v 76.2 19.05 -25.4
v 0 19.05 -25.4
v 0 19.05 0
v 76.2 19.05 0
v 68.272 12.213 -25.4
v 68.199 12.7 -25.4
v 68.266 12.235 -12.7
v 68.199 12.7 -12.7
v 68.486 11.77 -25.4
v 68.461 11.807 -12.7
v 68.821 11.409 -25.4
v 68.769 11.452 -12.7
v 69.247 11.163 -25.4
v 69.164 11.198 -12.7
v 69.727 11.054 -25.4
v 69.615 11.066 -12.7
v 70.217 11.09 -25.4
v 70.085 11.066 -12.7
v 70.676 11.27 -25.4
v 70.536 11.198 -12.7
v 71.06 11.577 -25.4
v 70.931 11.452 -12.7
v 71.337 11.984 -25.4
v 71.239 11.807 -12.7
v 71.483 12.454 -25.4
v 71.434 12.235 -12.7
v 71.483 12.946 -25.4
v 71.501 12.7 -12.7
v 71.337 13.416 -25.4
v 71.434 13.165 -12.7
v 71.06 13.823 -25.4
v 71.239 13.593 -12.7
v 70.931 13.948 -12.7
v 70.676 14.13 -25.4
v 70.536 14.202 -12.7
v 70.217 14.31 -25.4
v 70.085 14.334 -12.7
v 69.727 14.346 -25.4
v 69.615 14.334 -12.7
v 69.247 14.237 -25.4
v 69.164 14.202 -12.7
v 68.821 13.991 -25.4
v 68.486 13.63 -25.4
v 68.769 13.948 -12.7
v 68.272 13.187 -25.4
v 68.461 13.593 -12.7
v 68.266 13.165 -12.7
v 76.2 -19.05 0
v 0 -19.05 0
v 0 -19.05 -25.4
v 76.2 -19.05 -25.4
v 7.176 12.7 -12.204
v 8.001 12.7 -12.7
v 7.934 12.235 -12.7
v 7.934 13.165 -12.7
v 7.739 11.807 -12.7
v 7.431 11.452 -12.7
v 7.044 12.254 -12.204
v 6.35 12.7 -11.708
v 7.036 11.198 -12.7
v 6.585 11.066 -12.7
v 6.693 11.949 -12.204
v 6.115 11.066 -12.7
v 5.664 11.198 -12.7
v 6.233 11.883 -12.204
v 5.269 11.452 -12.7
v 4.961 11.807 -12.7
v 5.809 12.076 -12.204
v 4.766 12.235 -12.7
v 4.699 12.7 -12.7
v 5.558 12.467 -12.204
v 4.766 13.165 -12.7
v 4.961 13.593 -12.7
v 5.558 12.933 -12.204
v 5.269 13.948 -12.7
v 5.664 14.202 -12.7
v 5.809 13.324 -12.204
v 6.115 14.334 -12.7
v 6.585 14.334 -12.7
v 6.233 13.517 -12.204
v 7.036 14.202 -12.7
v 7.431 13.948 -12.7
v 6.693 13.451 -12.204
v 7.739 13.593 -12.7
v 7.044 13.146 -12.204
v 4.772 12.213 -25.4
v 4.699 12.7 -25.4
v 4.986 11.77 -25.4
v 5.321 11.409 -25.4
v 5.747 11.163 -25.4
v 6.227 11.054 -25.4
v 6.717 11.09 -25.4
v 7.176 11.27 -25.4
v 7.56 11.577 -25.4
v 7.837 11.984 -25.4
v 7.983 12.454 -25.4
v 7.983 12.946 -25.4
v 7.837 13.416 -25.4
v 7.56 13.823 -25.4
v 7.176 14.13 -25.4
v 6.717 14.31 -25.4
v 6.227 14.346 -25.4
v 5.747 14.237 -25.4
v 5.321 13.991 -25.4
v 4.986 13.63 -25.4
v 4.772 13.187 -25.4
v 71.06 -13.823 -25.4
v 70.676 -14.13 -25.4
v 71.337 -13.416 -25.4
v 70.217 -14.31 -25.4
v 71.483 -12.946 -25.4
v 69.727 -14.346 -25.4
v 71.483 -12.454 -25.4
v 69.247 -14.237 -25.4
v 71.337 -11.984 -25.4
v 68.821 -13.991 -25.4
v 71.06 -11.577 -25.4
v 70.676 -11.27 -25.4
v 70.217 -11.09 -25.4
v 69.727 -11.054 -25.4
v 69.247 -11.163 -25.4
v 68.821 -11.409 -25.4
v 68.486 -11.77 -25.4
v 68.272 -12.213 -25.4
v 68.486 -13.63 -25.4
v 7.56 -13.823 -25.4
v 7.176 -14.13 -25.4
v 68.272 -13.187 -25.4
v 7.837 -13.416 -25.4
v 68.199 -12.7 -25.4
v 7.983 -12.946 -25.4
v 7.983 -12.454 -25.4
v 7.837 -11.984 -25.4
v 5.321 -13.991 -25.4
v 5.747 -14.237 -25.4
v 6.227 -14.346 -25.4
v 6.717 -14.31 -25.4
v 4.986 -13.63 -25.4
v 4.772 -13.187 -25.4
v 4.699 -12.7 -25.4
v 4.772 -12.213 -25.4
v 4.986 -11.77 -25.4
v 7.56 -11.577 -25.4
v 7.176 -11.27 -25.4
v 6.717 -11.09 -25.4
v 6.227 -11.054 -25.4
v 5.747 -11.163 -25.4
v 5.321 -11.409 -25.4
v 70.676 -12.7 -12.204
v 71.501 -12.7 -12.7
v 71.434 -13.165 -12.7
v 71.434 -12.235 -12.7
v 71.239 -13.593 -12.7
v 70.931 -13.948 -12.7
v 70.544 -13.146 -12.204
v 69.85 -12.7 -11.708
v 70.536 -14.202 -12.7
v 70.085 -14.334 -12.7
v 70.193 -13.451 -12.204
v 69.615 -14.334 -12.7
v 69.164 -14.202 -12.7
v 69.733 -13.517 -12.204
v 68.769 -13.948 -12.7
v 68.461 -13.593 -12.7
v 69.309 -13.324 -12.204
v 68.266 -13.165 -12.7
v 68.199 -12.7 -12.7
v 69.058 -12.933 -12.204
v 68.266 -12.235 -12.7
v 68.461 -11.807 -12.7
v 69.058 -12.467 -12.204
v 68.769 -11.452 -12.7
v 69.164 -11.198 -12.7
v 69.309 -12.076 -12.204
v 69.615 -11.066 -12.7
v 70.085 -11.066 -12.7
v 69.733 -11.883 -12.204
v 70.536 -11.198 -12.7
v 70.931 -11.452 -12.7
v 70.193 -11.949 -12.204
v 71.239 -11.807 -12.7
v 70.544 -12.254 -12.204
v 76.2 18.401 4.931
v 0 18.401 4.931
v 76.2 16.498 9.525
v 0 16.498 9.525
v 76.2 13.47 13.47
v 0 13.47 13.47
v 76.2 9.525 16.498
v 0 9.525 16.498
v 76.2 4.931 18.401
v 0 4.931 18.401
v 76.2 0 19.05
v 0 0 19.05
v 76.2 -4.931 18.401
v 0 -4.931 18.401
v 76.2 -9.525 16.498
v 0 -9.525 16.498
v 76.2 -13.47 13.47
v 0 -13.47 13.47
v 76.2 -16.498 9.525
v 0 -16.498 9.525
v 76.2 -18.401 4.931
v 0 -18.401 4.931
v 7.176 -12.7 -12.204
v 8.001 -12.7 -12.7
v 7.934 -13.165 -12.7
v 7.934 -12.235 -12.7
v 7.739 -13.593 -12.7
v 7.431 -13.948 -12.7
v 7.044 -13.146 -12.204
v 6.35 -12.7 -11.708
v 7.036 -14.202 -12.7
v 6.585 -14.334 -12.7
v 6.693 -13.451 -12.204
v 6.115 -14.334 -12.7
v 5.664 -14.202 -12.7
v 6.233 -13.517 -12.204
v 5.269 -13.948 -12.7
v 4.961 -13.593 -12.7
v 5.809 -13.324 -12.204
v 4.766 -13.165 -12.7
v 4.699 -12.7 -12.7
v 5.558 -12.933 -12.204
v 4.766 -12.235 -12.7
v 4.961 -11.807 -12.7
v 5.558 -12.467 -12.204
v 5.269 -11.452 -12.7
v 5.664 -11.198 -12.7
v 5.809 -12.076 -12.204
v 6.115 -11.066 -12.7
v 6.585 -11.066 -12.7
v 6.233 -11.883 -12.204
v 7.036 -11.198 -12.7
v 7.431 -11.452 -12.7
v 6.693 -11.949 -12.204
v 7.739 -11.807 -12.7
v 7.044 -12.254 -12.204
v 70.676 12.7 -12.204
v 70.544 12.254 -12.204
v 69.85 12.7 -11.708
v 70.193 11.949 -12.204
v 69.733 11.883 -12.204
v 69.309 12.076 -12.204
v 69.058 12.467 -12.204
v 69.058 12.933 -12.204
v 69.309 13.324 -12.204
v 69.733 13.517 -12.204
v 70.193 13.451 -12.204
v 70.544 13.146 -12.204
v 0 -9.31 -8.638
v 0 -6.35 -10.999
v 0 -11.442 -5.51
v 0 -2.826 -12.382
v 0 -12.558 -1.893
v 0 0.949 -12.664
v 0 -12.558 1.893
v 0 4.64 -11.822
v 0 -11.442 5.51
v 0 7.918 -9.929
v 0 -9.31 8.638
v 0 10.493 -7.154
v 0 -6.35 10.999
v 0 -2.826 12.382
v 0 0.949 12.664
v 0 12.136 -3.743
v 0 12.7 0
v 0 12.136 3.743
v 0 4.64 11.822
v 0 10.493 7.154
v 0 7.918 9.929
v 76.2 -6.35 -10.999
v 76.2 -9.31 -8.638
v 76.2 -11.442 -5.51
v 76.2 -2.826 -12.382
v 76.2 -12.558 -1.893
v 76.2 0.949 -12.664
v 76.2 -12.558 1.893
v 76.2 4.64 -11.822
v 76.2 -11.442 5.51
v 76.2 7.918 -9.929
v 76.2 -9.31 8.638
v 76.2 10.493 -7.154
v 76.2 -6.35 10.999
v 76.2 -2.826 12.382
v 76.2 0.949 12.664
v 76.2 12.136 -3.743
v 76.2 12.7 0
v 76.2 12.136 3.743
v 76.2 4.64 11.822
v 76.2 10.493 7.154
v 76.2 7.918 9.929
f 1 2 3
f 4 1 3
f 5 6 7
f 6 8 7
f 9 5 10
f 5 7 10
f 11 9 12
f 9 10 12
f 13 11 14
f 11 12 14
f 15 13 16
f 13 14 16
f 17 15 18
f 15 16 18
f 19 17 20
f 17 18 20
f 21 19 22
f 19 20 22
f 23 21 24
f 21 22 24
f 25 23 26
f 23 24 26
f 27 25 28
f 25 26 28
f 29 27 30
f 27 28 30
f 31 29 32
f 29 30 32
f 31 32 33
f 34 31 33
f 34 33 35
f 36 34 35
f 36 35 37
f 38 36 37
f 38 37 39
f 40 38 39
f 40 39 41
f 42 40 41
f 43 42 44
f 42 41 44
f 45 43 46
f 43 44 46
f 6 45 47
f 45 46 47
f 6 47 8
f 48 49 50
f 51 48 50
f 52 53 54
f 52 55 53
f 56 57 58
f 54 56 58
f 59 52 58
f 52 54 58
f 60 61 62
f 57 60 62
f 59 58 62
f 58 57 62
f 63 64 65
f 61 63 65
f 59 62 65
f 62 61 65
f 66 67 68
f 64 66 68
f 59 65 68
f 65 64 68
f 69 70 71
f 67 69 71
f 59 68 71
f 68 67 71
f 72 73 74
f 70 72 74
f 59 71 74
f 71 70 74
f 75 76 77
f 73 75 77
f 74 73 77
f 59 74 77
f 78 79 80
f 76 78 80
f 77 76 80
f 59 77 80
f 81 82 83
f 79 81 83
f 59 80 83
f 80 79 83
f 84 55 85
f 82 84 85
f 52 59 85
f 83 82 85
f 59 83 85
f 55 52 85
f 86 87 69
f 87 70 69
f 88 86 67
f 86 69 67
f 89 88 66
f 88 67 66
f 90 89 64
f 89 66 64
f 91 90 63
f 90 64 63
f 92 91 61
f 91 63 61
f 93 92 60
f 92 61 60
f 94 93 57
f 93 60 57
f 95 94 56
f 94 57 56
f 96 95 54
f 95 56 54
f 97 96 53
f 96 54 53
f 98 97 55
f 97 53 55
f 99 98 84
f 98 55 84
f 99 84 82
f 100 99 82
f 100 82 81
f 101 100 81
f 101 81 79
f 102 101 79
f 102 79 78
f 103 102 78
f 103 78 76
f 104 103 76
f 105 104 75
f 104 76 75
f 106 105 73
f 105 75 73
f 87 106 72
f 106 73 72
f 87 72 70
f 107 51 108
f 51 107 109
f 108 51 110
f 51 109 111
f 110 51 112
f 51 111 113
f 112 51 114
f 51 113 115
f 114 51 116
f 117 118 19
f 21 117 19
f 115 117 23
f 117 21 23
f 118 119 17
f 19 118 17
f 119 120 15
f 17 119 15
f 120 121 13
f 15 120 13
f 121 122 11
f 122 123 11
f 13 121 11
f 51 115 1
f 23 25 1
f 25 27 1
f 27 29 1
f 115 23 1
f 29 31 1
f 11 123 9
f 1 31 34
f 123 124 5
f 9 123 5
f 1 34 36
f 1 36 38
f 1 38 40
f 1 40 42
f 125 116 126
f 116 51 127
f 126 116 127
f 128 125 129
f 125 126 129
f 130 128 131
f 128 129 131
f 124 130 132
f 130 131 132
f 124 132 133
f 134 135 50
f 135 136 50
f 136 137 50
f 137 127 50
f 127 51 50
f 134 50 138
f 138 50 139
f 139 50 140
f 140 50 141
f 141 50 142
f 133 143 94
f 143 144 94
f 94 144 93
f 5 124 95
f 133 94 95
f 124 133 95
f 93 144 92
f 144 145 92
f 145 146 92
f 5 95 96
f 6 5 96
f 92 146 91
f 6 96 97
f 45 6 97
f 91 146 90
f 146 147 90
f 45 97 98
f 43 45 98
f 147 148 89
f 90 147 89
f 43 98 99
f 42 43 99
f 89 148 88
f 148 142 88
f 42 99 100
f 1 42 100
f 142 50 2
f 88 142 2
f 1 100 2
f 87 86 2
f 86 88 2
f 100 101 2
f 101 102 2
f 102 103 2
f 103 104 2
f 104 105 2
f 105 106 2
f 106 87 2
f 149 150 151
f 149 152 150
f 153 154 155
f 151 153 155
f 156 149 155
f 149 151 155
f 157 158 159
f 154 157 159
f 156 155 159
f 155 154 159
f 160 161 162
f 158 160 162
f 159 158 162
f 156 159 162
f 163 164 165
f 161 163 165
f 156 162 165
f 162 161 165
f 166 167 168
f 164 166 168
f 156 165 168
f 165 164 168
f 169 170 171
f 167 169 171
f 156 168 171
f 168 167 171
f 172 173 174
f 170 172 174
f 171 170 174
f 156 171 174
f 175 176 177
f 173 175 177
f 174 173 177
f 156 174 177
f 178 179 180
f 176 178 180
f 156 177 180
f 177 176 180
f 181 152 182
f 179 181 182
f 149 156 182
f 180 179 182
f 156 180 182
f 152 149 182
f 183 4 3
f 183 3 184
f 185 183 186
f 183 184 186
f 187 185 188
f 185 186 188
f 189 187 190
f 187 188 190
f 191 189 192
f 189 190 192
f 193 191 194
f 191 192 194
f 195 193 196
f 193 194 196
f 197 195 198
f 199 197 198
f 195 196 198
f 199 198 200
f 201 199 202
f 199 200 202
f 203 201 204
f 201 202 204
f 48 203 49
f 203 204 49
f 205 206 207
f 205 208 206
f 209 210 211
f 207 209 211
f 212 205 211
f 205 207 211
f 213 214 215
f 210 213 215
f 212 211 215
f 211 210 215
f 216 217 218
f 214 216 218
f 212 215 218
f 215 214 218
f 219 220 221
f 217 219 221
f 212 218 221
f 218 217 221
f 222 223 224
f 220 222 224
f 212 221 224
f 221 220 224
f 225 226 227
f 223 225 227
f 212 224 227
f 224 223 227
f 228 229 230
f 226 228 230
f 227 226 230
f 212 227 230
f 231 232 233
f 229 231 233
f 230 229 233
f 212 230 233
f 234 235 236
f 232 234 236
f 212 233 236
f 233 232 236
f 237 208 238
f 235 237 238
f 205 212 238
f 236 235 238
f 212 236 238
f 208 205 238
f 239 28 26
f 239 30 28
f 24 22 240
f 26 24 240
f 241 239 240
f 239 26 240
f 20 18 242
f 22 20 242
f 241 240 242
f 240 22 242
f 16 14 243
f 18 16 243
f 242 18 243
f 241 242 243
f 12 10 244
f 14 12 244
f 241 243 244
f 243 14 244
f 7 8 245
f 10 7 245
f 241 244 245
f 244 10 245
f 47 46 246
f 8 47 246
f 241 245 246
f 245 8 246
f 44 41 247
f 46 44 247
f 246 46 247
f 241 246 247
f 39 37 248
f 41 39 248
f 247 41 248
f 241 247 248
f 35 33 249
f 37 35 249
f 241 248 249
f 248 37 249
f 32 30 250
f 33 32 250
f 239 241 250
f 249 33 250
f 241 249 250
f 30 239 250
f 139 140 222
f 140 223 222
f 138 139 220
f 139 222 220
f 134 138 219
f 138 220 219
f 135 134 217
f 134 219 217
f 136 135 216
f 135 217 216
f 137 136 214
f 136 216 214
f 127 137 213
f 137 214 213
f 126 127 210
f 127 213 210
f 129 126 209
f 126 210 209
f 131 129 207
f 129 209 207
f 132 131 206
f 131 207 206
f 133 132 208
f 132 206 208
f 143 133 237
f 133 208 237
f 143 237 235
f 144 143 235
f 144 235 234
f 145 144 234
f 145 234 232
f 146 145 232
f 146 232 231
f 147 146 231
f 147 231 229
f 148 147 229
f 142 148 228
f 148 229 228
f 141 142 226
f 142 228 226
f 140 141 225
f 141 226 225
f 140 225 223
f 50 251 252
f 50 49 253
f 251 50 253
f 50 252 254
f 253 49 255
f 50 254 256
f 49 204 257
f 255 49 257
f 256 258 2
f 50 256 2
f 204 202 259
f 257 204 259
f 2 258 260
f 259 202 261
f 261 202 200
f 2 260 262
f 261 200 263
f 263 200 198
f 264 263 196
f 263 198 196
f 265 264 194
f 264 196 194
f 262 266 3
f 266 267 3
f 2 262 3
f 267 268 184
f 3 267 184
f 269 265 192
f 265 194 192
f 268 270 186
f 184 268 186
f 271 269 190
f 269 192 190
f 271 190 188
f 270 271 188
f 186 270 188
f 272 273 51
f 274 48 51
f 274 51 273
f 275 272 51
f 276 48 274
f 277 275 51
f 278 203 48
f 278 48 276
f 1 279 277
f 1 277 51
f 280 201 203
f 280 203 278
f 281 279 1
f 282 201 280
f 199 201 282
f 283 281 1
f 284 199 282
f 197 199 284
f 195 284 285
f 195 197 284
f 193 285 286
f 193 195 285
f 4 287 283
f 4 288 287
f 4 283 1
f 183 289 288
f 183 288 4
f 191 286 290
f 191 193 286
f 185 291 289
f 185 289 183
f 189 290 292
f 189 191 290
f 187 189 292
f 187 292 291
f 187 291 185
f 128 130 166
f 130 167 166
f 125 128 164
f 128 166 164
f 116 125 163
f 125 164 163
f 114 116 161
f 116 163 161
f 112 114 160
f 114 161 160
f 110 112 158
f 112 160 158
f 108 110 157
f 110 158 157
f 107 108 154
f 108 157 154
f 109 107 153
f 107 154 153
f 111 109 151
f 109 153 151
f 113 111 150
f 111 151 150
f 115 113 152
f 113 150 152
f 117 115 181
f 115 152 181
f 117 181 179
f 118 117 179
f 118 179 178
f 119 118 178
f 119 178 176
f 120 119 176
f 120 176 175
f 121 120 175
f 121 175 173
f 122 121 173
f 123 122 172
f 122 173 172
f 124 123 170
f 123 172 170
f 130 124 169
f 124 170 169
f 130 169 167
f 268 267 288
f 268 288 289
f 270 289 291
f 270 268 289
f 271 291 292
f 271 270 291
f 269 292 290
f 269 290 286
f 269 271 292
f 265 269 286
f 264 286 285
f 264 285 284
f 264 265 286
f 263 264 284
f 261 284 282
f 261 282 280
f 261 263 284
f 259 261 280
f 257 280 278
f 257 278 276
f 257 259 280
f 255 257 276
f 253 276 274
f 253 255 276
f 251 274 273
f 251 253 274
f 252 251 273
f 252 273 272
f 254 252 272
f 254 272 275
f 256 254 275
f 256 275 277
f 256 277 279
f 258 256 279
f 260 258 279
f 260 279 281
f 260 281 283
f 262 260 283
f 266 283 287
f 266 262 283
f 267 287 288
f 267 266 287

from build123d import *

# Parameters (mm, degrees)
F0_R     = 12.7
F1_DEPTH = 76.2
F4_D     = 3.302
F4_DEPTH = 12.7
F4_TIP   = 0.992020882


with BuildPart() as f1:
    # F0 (on Right) → F1 (new body)
    with BuildSketch(Plane.YZ):
        with BuildLine():
            Line((19.05, -25.4), (19.05, 0))
            ThreePointArc((19.05, 0), (0, 19.05), (-19.05, 0))
            Line((-19.05, 0), (-19.05, -25.4))
            Line((-19.05, -25.4), (19.05, -25.4))
        make_face()
        Circle(F0_R, mode=Mode.SUBTRACT)
    extrude(amount=F1_DEPTH)

    # F4
    with Locations(Plane(origin=(0, 0, -25.4), x_dir=(1, 0, 0), z_dir=(0, 0, -1))):
        with Locations((6.35, 12.7), (6.35, -12.7), (69.85, -12.7), (69.85, 12.7)):
            Hole(F4_D / 2, depth=F4_DEPTH)
            with Locations((0, 0, -(F4_DEPTH + F4_TIP / 2))):  # 118° drill point
                Cone(0, F4_D / 2, F4_TIP, mode=Mode.SUBTRACT)


solid = f1.part
